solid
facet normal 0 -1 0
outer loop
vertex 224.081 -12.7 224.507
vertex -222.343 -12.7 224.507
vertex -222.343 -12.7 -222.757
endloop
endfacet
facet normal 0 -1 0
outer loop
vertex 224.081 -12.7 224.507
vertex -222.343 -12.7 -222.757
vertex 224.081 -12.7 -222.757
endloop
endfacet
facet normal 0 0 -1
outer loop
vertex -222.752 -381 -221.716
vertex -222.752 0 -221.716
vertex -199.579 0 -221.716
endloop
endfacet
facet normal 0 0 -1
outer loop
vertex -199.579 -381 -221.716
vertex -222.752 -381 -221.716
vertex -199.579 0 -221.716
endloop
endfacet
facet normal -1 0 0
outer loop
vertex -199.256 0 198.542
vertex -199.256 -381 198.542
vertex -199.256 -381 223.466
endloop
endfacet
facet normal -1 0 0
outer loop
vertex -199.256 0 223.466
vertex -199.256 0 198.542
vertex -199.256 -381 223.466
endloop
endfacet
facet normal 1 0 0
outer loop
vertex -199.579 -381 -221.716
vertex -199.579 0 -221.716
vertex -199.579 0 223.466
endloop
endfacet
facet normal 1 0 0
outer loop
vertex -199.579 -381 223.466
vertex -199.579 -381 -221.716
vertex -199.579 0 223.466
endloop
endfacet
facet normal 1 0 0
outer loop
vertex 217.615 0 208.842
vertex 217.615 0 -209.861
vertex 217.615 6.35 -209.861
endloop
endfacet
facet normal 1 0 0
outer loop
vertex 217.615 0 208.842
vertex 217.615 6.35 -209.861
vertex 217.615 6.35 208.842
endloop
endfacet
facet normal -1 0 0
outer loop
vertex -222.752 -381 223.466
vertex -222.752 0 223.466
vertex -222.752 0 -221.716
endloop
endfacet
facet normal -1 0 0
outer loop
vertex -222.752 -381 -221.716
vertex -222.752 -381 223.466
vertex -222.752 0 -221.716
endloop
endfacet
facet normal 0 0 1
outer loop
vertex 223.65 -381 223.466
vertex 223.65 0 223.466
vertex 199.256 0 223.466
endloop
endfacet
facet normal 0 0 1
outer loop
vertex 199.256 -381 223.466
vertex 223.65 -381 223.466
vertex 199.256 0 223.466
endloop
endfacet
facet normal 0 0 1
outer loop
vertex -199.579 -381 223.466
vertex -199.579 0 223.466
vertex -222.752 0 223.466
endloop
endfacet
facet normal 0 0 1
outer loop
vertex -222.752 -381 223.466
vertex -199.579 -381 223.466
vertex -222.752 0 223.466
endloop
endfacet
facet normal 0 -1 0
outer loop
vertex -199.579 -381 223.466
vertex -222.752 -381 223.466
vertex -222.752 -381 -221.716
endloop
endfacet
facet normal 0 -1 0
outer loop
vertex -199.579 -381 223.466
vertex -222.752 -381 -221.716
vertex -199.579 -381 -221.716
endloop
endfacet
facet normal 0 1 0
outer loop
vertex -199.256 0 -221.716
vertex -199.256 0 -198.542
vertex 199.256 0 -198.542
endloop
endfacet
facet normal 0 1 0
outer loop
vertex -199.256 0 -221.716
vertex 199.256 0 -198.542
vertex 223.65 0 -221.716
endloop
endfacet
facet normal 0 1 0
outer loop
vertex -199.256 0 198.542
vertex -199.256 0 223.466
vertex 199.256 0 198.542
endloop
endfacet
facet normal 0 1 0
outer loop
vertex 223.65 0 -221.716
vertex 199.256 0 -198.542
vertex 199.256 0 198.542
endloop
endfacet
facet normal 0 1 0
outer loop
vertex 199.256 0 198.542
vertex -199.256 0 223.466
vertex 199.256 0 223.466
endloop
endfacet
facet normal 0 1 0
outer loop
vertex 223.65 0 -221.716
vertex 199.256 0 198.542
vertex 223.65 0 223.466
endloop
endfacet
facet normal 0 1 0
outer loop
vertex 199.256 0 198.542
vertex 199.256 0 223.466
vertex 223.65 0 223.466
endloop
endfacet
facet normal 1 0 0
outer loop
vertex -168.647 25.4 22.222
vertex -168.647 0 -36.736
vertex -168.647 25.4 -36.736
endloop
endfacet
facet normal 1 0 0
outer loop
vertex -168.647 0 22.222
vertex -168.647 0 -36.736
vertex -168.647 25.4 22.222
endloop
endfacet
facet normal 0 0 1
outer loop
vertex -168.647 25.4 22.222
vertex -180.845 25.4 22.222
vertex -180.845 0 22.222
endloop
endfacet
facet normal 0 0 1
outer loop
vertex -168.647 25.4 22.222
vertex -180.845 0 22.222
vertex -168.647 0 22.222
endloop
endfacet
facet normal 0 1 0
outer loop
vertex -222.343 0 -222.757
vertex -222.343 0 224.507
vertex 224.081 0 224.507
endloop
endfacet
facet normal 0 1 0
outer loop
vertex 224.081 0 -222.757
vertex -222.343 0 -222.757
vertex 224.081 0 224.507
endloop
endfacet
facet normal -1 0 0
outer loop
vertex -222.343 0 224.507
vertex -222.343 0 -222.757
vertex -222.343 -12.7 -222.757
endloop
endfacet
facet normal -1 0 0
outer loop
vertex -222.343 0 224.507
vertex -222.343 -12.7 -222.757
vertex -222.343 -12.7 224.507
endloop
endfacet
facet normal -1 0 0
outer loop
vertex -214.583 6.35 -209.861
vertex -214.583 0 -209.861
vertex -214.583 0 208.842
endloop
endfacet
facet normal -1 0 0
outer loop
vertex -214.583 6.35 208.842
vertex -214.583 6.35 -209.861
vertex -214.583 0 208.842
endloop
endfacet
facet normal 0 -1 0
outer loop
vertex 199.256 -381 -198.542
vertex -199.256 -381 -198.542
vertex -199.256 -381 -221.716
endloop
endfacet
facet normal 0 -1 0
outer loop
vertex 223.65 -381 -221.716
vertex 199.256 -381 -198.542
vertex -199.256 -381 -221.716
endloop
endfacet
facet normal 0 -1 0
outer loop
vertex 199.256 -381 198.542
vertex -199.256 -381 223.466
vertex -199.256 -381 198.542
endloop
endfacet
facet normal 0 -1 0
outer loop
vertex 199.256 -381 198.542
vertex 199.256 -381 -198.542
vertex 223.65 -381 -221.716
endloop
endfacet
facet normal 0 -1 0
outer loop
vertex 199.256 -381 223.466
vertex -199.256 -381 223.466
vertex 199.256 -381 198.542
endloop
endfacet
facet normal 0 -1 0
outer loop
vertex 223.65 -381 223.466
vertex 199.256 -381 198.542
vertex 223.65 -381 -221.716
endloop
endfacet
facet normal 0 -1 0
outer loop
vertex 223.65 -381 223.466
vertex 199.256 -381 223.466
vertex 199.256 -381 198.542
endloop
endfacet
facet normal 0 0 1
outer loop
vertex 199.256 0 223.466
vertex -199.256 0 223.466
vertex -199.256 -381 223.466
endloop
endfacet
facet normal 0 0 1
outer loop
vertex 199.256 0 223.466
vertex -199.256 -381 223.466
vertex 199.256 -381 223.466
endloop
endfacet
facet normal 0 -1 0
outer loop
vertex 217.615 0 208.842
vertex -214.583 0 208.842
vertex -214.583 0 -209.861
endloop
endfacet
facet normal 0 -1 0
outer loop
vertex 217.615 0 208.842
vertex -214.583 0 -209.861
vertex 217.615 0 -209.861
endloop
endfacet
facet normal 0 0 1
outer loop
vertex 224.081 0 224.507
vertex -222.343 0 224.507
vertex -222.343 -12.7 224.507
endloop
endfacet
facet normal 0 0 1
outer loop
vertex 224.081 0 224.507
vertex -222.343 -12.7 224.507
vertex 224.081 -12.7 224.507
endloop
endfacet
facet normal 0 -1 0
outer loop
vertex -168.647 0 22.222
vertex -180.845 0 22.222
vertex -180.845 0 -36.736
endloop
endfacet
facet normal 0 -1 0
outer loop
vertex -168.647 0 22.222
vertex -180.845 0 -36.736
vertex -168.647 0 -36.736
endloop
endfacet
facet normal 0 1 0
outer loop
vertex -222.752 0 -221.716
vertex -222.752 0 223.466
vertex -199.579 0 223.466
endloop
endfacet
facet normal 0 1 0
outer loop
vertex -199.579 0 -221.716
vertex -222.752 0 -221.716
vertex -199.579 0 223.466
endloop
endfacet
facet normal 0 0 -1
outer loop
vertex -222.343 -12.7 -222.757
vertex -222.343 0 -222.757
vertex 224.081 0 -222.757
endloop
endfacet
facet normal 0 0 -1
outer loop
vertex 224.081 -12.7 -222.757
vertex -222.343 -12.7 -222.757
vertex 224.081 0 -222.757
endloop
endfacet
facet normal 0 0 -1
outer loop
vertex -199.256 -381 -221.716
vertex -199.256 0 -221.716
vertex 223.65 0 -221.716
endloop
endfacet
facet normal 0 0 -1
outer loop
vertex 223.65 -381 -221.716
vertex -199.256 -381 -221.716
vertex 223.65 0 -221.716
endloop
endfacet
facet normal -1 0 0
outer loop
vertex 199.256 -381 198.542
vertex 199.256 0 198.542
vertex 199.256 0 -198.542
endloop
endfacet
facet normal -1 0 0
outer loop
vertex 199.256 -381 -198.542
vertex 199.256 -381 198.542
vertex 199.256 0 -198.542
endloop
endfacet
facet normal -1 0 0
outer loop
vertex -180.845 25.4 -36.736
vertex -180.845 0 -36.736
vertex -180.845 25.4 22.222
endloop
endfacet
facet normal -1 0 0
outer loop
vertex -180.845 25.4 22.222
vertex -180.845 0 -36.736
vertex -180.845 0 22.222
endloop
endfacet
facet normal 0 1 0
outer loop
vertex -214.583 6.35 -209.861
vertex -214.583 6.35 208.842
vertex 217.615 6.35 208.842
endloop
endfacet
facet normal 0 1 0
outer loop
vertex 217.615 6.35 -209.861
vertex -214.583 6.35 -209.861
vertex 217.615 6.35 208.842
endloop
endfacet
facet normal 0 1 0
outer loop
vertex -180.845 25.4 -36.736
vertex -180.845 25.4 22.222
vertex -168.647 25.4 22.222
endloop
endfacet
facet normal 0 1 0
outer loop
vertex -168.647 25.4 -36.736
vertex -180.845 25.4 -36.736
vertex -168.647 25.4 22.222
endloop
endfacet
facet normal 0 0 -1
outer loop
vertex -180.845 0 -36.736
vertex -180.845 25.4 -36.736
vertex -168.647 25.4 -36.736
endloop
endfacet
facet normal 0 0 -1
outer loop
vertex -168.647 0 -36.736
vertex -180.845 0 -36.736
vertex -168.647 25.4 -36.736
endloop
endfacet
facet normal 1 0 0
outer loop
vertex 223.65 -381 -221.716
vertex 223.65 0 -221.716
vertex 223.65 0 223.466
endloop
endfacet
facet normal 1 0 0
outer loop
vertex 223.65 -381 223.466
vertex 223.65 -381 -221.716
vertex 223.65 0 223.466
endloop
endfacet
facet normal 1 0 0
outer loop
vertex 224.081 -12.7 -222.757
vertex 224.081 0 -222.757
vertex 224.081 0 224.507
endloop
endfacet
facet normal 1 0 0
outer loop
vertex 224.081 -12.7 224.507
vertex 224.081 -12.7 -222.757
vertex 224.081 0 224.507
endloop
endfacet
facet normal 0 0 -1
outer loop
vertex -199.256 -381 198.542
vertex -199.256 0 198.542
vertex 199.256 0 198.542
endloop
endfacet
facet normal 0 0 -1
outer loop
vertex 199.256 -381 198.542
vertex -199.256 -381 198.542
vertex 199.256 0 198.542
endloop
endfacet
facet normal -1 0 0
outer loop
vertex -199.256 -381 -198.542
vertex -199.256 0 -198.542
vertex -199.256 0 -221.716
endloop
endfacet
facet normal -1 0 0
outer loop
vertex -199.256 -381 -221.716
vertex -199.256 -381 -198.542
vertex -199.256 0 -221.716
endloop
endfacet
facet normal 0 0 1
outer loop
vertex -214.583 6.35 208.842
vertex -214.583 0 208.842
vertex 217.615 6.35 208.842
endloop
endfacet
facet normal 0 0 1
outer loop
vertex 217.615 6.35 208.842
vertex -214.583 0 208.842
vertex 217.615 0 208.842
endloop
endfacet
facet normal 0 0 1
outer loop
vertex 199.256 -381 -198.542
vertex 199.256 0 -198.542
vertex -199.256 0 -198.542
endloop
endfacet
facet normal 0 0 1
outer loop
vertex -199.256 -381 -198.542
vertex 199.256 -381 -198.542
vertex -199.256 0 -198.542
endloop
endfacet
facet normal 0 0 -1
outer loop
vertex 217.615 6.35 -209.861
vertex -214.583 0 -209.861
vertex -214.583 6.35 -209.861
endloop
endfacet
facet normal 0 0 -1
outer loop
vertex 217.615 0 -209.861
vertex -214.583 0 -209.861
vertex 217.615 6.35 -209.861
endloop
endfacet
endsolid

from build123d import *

# Parameters (mm, degrees)
F0_W     = 398.512424
F0_H     = 24.923801
F1_DEPTH = 381
F2_W     = 446.423635
F2_H     = 447.264388
F3_DEPTH = 12.7
F4_W     = 432.198376
F4_H     = 418.703169
F5_DEPTH = 6.35
F6_W     = 12.198135
F6_H     = 58.957581
F7_DEPTH = 25.4


with BuildPart() as f1:
    # F0 (on Front) → F1 (new body)
    with BuildSketch(Plane.XZ):
        Polygon((-199.578598, -221.716329), (-199.578598, -198.542446), (-199.578598, 223.466247), (-222.752482, 223.466247), (-222.752482, -221.716329), align=None)
        with Locations((0, 211.004346)):
            Rectangle(F0_W, F0_H)
        Polygon((199.256212, 198.542446), (199.256212, -198.542446), (223.64977, -198.542446), (223.64977, 223.466247), (199.256212, 223.466247), align=None)
        Polygon((223.64977, -198.542446), (199.256212, -198.542446), (-199.256212, -198.542446), (-199.256212, -221.716329), (223.64977, -221.716329), align=None)
    extrude(amount=F1_DEPTH)


with BuildPart() as f3:
    # F2 (on Front) → F3 (new body)
    with BuildSketch(Plane.XZ):
        with Locations((0.868999, 0.874959)):
            Rectangle(F2_W, F2_H)
    extrude(amount=F3_DEPTH)


with BuildPart() as f5:
    # F4 (on Front) → F5 (new body)
    with BuildSketch(Plane.XZ):
        with Locations((1.515776, -0.509337)):
            Rectangle(F4_W, F4_H)
    extrude(amount=-F5_DEPTH)


with BuildPart() as f7:
    # F6 (on Front) → F7 (new body)
    with BuildSketch(Plane.XZ):
        with Locations((-174.746252, -7.257121)):
            Rectangle(F6_W, F6_H)
    extrude(amount=-F7_DEPTH)


solid = Compound([f1.part, f3.part, f5.part, f7.part])
